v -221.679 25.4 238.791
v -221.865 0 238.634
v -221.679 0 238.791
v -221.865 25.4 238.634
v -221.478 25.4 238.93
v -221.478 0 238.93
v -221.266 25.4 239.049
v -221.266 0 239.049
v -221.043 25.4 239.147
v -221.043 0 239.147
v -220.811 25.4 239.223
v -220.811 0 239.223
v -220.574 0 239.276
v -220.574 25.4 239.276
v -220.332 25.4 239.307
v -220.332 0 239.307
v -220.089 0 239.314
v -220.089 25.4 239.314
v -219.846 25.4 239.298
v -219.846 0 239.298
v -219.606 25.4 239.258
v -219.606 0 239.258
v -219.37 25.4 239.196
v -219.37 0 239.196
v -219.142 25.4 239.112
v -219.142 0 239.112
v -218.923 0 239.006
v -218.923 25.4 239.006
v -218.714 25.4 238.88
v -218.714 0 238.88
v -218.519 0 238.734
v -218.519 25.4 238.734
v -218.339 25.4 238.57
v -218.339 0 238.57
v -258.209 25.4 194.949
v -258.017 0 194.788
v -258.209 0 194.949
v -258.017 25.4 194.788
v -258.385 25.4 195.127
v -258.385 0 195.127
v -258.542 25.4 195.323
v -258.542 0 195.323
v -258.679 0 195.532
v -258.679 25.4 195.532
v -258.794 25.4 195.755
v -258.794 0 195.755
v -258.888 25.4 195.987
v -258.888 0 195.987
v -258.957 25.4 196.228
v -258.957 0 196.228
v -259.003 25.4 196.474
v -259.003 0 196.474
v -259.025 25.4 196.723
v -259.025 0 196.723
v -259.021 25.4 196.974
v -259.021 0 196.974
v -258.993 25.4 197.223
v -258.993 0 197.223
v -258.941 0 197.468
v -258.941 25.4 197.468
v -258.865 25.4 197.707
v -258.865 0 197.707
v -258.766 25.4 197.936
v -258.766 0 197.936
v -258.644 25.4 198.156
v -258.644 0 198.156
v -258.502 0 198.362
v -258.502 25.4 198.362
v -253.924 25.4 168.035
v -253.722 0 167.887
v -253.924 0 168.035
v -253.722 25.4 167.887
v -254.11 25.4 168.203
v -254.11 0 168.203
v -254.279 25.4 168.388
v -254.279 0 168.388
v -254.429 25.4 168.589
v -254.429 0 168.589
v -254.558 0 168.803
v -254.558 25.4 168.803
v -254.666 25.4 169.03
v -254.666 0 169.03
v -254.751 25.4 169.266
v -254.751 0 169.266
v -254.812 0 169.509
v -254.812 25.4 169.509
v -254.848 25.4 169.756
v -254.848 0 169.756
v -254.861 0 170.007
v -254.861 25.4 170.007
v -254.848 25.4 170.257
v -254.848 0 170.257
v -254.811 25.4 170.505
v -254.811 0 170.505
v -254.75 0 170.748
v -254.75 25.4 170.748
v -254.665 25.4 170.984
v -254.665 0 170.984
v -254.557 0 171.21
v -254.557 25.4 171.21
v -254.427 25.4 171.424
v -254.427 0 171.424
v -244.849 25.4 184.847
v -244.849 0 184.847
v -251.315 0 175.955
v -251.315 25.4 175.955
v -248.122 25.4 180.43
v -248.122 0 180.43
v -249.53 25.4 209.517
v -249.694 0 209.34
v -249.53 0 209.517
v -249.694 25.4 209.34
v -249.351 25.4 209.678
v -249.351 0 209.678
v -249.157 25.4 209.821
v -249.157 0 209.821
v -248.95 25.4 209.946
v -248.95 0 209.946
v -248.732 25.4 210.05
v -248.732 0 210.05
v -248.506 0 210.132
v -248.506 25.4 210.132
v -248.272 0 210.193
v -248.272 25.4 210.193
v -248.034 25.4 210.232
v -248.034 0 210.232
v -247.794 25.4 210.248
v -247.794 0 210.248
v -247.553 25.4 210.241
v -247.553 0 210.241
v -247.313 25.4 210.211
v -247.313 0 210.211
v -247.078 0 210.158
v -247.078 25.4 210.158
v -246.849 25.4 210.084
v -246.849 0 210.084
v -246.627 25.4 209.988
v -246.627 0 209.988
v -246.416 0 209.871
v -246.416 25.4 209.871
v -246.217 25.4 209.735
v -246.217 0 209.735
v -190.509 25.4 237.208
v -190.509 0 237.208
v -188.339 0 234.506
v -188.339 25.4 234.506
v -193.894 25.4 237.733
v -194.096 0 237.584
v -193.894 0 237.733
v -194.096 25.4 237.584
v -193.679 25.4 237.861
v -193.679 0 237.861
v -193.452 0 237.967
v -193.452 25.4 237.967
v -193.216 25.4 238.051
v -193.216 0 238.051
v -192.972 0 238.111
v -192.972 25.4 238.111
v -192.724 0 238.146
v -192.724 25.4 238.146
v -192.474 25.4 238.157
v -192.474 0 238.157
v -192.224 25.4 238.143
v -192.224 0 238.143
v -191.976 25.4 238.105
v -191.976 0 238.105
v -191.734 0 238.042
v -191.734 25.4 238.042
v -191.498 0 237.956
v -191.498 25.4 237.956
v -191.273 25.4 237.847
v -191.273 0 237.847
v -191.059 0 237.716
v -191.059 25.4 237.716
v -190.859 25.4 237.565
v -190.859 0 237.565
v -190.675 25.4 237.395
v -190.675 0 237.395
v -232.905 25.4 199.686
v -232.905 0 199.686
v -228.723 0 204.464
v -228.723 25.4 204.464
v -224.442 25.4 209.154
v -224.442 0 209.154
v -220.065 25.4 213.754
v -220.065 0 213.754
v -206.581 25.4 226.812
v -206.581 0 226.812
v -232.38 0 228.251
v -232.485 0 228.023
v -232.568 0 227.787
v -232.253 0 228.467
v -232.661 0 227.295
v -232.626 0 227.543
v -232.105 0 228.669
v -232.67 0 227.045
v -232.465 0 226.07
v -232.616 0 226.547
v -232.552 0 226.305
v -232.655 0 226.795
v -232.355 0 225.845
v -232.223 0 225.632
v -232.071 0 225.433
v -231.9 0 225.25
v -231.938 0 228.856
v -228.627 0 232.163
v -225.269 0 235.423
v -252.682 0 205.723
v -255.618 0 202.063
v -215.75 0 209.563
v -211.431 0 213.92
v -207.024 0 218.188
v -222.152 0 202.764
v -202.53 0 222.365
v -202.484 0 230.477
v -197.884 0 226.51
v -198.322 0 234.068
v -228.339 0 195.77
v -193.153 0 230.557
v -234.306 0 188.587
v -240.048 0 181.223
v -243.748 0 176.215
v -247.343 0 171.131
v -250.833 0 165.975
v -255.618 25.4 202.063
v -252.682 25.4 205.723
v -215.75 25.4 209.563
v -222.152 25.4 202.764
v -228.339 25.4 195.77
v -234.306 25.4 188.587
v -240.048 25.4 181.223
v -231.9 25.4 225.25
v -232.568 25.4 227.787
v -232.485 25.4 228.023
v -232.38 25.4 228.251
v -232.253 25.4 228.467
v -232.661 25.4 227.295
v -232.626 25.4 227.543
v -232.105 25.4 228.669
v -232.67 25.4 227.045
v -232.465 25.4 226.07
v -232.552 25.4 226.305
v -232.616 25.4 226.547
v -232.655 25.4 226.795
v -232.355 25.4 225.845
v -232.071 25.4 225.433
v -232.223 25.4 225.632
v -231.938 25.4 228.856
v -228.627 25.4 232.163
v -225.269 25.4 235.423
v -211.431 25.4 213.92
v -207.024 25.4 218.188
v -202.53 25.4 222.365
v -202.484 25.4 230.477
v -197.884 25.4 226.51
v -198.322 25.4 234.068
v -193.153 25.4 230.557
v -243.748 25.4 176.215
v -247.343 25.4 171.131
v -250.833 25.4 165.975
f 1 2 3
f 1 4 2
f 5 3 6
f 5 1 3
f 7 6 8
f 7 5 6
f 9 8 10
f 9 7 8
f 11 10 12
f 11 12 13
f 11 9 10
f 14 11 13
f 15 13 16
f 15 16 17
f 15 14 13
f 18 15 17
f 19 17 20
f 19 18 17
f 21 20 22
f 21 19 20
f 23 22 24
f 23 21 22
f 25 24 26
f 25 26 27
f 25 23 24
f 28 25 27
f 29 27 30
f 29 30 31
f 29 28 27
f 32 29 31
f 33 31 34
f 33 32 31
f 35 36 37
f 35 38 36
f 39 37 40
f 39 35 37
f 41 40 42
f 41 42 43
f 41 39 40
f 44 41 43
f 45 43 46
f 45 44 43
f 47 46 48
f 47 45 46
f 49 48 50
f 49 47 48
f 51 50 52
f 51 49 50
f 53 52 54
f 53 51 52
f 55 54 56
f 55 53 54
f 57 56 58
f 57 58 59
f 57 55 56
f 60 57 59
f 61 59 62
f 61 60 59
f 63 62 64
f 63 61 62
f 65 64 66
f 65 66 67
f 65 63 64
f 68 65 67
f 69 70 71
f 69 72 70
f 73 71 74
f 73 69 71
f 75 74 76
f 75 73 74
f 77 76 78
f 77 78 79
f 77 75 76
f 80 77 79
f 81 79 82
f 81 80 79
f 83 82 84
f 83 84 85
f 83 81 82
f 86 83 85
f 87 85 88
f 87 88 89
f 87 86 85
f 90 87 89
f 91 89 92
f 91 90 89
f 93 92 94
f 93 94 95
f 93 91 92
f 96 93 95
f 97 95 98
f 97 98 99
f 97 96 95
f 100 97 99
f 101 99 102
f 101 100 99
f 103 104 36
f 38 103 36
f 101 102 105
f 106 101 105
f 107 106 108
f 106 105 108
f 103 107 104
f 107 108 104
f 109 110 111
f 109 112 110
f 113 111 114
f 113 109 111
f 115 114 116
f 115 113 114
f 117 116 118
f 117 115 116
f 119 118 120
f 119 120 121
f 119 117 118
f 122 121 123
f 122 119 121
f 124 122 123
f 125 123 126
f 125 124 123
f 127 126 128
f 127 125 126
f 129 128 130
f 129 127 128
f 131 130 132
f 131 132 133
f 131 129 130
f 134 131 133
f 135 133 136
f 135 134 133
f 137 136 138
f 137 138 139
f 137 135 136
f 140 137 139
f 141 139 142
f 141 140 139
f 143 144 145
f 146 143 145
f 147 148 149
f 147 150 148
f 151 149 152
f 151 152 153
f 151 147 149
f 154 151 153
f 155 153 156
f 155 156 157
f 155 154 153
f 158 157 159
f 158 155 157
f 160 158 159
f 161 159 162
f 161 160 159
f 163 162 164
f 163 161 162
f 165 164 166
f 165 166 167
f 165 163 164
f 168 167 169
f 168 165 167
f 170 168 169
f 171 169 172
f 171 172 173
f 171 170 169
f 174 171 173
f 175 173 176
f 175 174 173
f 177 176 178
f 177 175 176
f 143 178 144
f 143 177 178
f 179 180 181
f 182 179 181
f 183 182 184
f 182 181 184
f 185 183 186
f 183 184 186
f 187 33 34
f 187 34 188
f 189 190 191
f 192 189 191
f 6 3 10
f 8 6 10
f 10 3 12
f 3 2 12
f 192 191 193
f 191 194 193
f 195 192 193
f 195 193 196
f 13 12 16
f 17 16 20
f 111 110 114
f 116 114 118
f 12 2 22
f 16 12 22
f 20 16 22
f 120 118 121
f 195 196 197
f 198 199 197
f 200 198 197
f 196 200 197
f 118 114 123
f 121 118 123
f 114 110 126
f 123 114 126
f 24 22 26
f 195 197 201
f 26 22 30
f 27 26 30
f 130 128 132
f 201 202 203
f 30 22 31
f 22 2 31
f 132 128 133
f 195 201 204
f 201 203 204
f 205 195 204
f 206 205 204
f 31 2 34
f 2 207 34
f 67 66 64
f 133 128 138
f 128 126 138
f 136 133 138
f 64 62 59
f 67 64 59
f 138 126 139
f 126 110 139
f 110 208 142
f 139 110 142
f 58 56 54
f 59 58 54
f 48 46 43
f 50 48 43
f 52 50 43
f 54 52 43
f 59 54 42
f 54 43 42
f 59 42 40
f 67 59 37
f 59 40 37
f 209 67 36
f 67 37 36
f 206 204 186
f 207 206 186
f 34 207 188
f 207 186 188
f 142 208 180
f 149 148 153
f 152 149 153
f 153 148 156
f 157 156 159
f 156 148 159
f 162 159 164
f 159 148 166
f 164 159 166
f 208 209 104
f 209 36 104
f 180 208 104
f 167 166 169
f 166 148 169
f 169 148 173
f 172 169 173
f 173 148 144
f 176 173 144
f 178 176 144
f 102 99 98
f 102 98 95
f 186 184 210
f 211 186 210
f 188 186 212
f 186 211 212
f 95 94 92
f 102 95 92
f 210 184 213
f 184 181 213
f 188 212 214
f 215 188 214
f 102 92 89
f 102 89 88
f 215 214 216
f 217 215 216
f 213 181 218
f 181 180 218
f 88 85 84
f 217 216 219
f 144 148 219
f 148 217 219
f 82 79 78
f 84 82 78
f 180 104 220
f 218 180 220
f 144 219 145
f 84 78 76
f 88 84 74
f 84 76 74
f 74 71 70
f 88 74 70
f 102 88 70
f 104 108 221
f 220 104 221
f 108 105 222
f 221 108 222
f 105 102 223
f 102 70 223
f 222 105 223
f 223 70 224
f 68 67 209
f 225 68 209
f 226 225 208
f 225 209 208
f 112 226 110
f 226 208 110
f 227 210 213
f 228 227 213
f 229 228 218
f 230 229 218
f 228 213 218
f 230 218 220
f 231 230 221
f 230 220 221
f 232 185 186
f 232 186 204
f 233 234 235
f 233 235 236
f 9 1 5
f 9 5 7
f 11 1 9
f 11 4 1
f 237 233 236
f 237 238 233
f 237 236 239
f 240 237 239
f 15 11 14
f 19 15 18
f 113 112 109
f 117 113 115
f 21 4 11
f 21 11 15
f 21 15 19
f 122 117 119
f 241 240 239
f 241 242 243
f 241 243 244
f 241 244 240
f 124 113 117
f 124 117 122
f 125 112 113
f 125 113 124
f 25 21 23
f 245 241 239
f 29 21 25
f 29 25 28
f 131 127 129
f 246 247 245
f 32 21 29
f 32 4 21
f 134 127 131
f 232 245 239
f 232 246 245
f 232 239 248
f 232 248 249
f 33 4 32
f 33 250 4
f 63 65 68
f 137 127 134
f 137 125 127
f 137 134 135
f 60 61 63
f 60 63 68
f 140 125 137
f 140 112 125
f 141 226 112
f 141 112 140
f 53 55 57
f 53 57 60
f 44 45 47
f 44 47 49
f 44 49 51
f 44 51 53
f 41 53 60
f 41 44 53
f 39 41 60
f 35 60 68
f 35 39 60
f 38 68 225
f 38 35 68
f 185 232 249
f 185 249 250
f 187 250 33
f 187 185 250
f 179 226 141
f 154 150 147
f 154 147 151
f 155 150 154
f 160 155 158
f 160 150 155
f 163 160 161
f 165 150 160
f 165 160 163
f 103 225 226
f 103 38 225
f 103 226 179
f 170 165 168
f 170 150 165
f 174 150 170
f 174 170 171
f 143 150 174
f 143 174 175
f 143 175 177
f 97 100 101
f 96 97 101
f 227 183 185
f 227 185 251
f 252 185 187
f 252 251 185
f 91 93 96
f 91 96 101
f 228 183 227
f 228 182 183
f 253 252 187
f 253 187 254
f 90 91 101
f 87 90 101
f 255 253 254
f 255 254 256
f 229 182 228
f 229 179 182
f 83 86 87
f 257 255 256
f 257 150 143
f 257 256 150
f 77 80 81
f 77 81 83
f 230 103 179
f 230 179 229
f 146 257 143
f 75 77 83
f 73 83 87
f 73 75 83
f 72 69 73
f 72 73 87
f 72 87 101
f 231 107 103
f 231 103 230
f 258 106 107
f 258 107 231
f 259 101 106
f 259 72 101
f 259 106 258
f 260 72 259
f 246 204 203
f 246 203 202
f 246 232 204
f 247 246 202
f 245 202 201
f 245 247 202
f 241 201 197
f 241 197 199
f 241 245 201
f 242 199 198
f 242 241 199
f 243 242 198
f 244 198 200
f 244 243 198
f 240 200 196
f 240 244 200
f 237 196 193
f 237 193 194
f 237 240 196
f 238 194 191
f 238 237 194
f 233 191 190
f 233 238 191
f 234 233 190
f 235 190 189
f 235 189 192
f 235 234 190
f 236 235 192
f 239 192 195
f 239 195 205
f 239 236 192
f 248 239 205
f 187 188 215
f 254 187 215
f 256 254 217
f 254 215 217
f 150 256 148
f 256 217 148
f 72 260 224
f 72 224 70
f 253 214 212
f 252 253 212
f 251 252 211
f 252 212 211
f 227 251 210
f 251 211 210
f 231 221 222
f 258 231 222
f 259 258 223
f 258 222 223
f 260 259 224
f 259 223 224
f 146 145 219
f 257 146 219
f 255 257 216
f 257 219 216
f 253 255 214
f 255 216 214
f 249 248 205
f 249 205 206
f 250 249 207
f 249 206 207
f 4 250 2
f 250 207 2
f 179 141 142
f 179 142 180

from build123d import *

# Parameters (mm, degrees)
BOSS_EXTRUDE1_DEPTH = 25.4
FILLET1_R           = 2.54


with BuildPart() as part:
    # Sketch1 → Boss-Extrude1 (new body)
    with BuildSketch(Plane(origin=(0, 0, 0), x_dir=(1, 0, 0), z_dir=(0, 1, 0))):
        with BuildLine():
            Line((-244.848924974, -184.847069368), (-240.047965661, -181.222617027))
            ThreePointArc((-240.047965661, -181.222617027), (-245.558733938, -173.682385194), (-250.832740903, -165.974693346))
            Line((-250.832740903, -165.974693346), (-255.849395721, -169.294187212))
            ThreePointArc((-255.849395721, -169.294187212), (-250.469908617, -177.156032898), (-244.848924974, -184.847069368))
        make_face()
        with BuildLine():
            ThreePointArc((-232.905461186, -199.685956603), (-238.99238799, -192.359230601), (-244.848924974, -184.847069368))
            Line((-244.848924974, -184.847069368), (-260.051962799, -196.32450178))
            ThreePointArc((-260.051962799, -196.32450178), (-254.20265496, -203.841466748), (-248.136139057, -211.184255684))
            Line((-248.136139057, -211.184255684), (-232.905461186, -199.685956603))
        make_face()
        with BuildLine():
            ThreePointArc((-215.750093665, -209.562782535), (-228.339131483, -195.770027772), (-240.047965661, -181.222617027))
            Line((-240.047965661, -181.222617027), (-244.848924974, -184.847069368))
            ThreePointArc((-244.848924974, -184.847069368), (-238.99238799, -192.359230601), (-232.905461186, -199.685956603))
            ThreePointArc((-232.905461186, -199.685956603), (-226.594481496, -206.819670414), (-220.065095538, -213.754038186))
            Line((-220.065095538, -213.754038186), (-215.750093665, -209.562782535))
        make_face()
        with BuildLine():
            ThreePointArc((-206.580992956, -226.812099466), (-213.422935618, -220.386219322), (-220.065095538, -213.754038186))
            Line((-220.065095538, -213.754038186), (-233.729268137, -227.026347746))
            ThreePointArc((-233.729268137, -227.026347746), (-226.993847652, -233.760831798), (-220.064468162, -240.295574672))
            Line((-220.064468162, -240.295574672), (-206.580992956, -226.812099466))
        make_face()
        with BuildLine():
            ThreePointArc((-202.530385251, -222.364803398), (-209.238172175, -216.064920904), (-215.750093665, -209.562782535))
            Line((-215.750093665, -209.562782535), (-220.065095538, -213.754038186))
            ThreePointArc((-220.065095538, -213.754038186), (-213.422935618, -220.386219322), (-206.580992956, -226.812099466))
            Line((-206.580992956, -226.812099466), (-202.530385251, -222.364803398))
        make_face()
        with BuildLine():
            ThreePointArc((-188.338885995, -234.506133741), (-195.528897549, -228.545647439), (-202.530385251, -222.364803398))
            Line((-202.530385251, -222.364803398), (-206.580992956, -226.812099466))
            ThreePointArc((-206.580992956, -226.812099466), (-199.4394755, -233.116560388), (-192.105663715, -239.196256416))
            Line((-192.105663715, -239.196256416), (-188.338885995, -234.506133741))
        make_face()
    extrude(amount=BOSS_EXTRUDE1_DEPTH)

    # Fillet1
    fillet1_edges = [part.edges().sort_by_distance(p)[0] for p in [
        (-192.105663715, 12.7, 239.196256416),
        (-220.064468162, 12.7, 240.295574672),
        (-233.729268137, 12.7, 227.026347746),
        (-248.136139057, 12.7, 211.184255684),
        (-260.051962799, 12.7, 196.32450178),
        (-255.849395721, 12.7, 169.294187212),
    ]]
    fillet(fillet1_edges, radius=FILLET1_R)


solid = part.part
